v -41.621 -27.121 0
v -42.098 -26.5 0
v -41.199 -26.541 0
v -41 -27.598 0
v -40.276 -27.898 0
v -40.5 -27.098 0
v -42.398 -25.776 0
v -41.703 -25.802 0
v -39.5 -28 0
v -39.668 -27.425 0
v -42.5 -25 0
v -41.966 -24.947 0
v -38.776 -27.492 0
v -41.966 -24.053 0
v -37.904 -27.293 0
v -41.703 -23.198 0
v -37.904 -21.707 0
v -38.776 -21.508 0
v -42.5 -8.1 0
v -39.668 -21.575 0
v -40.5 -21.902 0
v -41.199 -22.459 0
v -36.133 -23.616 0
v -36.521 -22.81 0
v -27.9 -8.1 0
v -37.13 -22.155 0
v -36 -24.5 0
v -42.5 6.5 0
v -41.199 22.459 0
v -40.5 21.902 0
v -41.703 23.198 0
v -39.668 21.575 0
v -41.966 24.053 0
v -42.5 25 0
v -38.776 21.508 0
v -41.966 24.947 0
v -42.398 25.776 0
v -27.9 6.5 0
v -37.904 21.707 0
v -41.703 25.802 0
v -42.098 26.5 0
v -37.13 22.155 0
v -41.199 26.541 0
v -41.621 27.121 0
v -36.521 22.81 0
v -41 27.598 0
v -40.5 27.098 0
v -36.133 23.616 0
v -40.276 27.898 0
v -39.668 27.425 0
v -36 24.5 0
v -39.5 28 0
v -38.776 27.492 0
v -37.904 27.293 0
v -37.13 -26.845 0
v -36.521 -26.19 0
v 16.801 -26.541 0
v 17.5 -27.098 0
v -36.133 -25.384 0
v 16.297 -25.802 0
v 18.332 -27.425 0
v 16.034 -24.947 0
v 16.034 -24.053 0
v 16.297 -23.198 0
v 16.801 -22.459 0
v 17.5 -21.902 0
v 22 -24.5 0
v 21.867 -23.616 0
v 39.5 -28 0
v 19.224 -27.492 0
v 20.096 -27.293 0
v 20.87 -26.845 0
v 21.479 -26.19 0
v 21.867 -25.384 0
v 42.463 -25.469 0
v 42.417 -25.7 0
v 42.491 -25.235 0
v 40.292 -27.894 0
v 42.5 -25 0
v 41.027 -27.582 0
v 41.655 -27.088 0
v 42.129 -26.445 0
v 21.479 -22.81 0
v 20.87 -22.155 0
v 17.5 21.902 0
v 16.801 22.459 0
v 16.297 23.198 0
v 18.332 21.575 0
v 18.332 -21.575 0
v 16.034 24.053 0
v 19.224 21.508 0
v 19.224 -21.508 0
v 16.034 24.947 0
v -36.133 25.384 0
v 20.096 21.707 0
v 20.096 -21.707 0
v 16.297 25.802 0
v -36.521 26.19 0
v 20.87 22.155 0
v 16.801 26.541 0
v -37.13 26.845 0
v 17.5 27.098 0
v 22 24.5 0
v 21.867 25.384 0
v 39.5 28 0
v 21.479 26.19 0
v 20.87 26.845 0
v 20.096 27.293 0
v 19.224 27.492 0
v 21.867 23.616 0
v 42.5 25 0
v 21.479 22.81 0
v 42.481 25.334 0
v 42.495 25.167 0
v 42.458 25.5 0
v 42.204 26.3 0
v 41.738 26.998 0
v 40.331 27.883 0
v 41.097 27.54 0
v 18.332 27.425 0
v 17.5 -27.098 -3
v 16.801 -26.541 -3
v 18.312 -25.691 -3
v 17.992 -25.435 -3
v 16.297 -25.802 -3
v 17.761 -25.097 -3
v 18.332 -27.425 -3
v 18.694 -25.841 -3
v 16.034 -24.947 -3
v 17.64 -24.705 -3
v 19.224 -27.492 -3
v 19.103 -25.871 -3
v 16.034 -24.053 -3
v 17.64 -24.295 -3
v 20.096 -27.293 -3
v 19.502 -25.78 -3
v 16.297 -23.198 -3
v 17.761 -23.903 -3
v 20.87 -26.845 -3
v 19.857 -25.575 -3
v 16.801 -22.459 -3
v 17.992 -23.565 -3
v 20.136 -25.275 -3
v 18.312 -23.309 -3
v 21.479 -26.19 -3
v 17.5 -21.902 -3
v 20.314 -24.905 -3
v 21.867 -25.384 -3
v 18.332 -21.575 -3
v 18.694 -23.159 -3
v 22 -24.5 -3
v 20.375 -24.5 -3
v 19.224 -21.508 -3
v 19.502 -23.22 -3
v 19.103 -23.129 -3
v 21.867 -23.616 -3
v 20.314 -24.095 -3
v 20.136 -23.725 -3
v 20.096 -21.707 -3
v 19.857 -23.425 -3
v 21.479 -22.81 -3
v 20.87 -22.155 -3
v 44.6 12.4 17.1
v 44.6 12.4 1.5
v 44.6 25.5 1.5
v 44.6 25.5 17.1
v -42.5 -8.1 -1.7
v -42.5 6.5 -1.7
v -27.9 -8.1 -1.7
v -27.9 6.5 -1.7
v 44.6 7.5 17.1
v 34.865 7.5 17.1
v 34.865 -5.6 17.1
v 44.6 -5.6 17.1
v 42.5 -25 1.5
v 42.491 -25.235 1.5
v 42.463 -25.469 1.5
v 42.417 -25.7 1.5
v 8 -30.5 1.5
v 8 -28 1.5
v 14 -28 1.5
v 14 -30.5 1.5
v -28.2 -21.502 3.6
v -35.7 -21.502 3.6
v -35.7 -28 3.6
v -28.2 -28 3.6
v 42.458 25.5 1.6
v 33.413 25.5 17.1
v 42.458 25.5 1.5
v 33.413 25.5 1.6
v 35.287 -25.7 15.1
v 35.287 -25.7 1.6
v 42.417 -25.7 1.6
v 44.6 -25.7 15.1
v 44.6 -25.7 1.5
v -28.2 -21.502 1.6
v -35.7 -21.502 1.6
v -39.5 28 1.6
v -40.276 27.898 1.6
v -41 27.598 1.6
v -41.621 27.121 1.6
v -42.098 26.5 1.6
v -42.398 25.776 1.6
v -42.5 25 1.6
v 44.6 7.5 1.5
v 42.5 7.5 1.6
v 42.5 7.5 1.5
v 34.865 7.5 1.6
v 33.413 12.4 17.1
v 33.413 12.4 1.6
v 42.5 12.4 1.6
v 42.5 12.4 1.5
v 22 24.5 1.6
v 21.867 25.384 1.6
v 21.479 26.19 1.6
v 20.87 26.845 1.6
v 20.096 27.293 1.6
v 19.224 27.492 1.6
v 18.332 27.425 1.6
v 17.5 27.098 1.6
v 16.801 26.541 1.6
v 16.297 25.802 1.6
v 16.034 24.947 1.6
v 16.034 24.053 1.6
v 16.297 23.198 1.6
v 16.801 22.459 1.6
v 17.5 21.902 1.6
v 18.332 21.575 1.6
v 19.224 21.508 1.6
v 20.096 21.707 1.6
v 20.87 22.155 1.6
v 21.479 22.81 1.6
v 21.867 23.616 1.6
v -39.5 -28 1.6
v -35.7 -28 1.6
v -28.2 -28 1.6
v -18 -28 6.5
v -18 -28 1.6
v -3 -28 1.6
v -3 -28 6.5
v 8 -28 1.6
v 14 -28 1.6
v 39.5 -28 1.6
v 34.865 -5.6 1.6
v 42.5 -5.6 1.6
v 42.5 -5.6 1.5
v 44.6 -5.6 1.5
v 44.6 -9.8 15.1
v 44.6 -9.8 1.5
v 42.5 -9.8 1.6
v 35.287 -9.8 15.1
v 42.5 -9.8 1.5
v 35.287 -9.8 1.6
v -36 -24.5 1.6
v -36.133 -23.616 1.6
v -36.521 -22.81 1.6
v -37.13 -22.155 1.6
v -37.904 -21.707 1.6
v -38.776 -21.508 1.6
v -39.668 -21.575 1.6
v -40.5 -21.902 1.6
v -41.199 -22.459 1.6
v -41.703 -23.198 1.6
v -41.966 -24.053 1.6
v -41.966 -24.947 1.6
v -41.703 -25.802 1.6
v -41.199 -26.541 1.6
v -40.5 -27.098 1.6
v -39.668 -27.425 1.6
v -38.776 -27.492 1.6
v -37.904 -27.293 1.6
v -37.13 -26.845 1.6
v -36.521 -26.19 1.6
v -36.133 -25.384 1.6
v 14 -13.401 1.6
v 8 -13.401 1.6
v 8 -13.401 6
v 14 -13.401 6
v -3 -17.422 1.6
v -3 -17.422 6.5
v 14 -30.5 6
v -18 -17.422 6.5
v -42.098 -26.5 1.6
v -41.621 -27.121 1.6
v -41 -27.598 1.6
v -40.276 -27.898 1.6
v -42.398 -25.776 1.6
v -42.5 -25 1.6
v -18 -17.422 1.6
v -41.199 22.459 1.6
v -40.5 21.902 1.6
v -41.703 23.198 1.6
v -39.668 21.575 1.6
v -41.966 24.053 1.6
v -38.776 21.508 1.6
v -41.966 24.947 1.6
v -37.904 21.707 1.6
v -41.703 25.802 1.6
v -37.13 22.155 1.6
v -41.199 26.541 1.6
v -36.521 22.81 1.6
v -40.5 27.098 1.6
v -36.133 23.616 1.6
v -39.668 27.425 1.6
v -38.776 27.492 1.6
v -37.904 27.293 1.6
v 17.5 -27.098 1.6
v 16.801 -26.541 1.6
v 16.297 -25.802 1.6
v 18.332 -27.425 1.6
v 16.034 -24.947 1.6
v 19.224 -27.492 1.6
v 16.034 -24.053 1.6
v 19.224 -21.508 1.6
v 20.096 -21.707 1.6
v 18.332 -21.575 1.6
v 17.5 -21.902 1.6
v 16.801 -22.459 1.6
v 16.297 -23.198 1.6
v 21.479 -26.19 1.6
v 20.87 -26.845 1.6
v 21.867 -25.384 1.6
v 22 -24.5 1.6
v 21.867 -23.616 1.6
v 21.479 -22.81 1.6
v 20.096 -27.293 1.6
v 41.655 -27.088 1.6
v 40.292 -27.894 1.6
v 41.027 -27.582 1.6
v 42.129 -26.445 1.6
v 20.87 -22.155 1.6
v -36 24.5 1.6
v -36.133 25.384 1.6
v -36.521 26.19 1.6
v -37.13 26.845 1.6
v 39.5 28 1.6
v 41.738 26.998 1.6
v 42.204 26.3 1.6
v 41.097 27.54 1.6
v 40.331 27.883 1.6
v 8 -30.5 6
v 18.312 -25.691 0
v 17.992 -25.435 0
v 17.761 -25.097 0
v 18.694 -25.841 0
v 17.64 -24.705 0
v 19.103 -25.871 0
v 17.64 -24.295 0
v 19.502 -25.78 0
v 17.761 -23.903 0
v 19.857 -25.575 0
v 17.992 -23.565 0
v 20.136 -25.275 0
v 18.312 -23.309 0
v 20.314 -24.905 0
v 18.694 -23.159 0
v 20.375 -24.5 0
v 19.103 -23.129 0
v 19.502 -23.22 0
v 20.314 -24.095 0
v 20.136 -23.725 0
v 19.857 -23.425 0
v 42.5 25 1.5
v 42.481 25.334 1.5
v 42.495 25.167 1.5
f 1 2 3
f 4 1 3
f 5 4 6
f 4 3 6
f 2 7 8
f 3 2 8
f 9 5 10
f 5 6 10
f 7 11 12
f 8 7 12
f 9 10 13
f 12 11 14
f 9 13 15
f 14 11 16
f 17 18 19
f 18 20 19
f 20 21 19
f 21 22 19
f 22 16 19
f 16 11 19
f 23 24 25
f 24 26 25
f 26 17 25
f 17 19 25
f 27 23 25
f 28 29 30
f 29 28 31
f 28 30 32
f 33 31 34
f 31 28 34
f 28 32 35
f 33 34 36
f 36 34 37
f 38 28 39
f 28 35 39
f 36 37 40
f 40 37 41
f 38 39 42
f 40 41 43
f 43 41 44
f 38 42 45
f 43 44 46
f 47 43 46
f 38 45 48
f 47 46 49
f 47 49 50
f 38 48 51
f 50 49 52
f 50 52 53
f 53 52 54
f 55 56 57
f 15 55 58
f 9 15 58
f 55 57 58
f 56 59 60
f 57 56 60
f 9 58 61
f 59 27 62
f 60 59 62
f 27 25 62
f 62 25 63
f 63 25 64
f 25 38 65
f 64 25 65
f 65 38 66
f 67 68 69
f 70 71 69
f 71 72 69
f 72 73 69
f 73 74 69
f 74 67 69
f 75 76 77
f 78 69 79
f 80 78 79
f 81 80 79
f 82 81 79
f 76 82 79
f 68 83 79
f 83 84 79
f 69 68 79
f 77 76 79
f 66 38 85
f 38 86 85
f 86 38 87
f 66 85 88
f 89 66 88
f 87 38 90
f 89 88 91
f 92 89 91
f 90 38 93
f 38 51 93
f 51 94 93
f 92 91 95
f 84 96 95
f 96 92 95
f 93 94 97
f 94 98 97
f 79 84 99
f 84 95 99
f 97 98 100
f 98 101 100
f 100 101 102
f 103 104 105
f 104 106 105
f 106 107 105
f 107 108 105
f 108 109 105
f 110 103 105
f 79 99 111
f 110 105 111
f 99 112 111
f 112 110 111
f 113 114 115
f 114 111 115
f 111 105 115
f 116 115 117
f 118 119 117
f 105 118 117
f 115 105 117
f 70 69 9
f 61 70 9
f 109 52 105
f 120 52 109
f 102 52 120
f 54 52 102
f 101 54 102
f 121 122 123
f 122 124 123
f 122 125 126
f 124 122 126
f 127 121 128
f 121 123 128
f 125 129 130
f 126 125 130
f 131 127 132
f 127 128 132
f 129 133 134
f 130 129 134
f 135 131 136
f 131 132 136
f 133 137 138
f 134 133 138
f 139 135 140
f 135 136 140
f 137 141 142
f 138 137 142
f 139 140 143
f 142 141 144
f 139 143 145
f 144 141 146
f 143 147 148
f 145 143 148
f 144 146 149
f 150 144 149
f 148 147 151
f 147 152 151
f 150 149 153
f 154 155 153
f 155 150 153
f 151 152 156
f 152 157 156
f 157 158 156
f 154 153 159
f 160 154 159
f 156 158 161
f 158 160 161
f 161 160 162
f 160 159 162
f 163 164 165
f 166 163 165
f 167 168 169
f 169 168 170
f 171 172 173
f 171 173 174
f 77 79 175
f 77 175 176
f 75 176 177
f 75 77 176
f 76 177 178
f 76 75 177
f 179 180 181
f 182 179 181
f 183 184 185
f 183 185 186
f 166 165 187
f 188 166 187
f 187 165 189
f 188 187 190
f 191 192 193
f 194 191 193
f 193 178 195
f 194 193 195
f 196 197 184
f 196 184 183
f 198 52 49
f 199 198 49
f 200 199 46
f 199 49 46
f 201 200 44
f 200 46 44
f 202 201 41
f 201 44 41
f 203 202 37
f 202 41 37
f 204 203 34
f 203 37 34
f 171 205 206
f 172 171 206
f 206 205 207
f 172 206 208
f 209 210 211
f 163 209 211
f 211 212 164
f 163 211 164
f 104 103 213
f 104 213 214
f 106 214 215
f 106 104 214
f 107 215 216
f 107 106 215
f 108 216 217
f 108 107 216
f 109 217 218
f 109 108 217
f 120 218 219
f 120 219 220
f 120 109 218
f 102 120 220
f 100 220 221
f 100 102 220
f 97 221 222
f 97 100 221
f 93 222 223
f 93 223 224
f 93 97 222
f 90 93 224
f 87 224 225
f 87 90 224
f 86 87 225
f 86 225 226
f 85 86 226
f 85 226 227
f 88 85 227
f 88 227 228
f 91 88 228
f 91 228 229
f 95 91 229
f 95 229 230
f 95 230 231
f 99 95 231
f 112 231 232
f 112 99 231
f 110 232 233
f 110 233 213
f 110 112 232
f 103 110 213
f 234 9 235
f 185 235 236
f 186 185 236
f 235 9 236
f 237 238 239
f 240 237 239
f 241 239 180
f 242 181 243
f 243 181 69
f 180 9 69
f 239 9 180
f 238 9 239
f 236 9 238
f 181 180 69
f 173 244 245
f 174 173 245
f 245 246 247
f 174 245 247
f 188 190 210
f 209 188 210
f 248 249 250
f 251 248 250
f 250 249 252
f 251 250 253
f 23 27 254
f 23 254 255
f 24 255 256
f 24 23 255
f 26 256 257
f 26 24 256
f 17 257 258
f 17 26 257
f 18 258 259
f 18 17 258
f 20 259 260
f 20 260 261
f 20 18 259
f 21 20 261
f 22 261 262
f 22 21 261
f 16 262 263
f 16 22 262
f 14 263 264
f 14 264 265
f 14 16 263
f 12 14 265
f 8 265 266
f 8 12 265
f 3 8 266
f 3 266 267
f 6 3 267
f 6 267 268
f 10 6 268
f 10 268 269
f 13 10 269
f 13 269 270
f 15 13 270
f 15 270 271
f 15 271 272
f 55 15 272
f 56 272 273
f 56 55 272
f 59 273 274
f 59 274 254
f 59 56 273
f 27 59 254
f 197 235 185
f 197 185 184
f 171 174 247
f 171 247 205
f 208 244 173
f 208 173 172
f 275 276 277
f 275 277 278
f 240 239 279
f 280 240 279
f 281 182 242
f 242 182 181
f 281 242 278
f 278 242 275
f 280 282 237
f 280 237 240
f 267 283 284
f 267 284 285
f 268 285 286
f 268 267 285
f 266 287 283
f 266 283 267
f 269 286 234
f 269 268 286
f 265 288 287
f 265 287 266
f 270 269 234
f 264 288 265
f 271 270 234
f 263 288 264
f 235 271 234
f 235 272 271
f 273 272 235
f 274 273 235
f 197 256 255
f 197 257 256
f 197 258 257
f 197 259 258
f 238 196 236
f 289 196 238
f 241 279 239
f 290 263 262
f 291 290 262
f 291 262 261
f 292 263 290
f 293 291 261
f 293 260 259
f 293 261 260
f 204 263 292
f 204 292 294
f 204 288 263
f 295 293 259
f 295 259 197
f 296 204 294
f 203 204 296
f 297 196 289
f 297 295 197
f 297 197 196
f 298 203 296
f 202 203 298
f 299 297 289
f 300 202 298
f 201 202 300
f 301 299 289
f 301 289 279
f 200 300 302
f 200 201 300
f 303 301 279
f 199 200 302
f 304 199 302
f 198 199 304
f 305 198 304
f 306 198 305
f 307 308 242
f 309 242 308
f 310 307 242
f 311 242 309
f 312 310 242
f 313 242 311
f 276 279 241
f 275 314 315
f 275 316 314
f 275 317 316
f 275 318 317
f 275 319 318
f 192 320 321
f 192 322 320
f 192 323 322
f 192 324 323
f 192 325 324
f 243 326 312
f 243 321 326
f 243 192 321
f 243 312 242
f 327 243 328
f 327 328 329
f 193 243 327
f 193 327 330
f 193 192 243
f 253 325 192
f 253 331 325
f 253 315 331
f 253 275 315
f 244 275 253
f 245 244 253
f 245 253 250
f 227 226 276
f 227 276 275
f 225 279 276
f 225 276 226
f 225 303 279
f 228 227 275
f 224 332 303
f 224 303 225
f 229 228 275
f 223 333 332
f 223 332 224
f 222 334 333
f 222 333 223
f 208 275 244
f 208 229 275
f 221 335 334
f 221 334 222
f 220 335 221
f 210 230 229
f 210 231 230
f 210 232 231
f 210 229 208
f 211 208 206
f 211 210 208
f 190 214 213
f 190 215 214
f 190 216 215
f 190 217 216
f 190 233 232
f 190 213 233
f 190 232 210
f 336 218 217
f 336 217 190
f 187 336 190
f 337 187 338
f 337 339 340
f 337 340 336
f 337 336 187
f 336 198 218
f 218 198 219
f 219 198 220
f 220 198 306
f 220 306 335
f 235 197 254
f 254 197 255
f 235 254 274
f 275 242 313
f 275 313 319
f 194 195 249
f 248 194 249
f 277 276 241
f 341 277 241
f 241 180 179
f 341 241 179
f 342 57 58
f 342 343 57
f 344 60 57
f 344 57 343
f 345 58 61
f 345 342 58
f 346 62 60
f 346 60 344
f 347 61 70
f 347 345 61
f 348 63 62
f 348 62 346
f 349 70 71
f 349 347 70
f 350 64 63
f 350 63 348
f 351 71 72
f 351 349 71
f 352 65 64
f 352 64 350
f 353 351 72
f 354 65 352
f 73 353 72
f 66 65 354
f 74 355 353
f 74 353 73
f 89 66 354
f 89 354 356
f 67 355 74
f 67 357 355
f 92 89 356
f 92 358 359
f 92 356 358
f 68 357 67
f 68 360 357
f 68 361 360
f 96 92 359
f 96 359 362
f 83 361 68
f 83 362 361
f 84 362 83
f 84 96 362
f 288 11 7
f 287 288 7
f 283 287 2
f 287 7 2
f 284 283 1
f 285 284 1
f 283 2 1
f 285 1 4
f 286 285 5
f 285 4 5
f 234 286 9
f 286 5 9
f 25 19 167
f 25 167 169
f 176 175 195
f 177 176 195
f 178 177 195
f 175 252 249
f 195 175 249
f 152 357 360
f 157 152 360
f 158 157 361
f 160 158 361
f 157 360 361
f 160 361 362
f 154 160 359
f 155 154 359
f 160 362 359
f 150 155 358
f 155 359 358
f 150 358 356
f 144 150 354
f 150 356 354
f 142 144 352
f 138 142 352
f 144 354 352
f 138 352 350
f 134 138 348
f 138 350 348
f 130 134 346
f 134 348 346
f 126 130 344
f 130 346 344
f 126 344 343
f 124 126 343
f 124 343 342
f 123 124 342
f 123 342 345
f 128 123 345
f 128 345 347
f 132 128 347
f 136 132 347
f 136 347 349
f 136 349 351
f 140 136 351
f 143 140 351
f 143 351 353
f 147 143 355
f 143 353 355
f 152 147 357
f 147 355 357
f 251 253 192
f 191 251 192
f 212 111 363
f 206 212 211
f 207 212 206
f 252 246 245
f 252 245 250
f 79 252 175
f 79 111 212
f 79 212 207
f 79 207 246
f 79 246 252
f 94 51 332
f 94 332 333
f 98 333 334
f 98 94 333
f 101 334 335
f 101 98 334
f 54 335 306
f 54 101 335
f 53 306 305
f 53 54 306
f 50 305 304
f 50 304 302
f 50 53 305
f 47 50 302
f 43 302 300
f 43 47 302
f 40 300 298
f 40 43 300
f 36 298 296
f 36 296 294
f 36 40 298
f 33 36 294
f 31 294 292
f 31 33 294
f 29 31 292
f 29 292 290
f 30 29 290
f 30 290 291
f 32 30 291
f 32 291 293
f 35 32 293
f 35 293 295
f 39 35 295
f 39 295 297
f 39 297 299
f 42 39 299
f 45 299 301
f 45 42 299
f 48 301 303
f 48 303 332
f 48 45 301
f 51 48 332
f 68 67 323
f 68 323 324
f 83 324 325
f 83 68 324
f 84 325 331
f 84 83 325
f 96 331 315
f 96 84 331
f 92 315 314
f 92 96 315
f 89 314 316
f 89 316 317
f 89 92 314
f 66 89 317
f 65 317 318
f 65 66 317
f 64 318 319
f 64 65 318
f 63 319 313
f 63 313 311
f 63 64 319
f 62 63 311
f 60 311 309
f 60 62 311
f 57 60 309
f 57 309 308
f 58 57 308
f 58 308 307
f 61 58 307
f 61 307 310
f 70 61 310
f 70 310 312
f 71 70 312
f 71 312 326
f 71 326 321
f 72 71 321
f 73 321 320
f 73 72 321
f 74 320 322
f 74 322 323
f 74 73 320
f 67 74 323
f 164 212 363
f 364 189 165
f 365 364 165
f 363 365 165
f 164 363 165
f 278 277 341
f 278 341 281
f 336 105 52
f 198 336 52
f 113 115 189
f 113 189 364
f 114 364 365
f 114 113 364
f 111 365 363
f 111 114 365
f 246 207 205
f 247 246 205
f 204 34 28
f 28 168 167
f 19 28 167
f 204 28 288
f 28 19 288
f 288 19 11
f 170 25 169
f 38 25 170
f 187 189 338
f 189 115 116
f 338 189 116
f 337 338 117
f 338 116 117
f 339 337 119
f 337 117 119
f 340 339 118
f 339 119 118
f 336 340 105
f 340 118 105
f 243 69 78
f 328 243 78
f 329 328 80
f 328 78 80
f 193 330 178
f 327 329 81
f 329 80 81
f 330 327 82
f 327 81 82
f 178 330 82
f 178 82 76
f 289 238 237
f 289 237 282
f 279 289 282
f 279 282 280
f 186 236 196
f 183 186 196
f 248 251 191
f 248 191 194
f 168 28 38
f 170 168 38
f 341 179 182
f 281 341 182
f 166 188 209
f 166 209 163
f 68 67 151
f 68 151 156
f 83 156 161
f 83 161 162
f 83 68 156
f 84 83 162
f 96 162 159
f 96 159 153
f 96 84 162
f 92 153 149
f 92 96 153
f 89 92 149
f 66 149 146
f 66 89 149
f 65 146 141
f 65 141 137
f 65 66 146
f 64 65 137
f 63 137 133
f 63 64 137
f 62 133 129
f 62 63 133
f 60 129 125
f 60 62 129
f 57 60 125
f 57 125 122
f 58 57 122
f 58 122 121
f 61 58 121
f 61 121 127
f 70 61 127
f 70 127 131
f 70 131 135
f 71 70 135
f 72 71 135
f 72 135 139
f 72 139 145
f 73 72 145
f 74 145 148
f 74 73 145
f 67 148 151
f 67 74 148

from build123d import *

# Parameters (mm, degrees)
F0_W     = 14.6
F0_H     = 14.6
F0_R     = 3
F0_W_2   = 7.6352092624
F0_H_2   = 13.1
F0_W_3   = 6
F0_H_3   = 14.598642543
F0_W_4   = 15
F0_H_4   = 10.5779423118
F0_W_5   = 7.5
F0_H_5   = 6.4980006516
F1_DEPTH = 1.6
F2_DEPTH = 1.7
F0_W_6   = 2.1
F3_DEPTH = 17.1
F4_DEPTH = 15.1
F0_H_6   = 2.5
F5_DEPTH = 6
F6_DEPTH = 6.5
F7_DEPTH = 1.5
F8_DEPTH = 3.6
F0_R_2   = 1.375
F9_DEPTH = 3


with BuildPart() as f1:
    # F0 (on Top) → F1 (new body)
    with BuildSketch(Plane.XY):
        with Locations((-35.2, -0.8)):
            Rectangle(F0_W, F0_H)
        with BuildLine():
            ThreePointArc((-42.5, -25), (-41.6213203436, -27.1213203436), (-39.5, -28))
            Line((-39.5, -28), (-35.7, -28))
            Line((-35.7, -28), (-35.7, -21.5019993484))
            Line((-35.7, -21.5019993484), (-28.2, -21.5019993484))
            Line((-28.2, -21.5019993484), (-28.2, -28))
            Line((-28.2, -28), (-18, -28))
            Line((-18, -28), (-18, -17.4220576882))
            Line((-18, -17.4220576882), (-3, -17.4220576882))
            Line((-3, -17.4220576882), (-3, -28))
            Line((-3, -28), (8, -28))
            Line((8, -28), (8, -13.401357457))
            Line((8, -13.401357457), (14, -13.401357457))
            Line((14, -13.401357457), (14, -28))
            Line((14, -28), (39.5, -28))
            ThreePointArc((39.5, -28), (41.3574175621, -27.3558437979), (42.4171904292, -25.7))
            Line((42.4171904292, -25.7), (35.2872274816, -25.7))
            Line((35.2872274816, -25.7), (35.2872274816, -9.8))
            Line((35.2872274816, -9.8), (42.5, -9.8))
            Line((42.5, -9.8), (42.5, -5.6))
            Line((42.5, -5.6), (34.8647907376, -5.6))
            Line((34.8647907376, -5.6), (34.8647907376, 7.5))
            Line((34.8647907376, 7.5), (42.5, 7.5))
            Line((42.5, 7.5), (42.5, 12.4))
            Line((42.5, 12.4), (33.4132947028, 12.4))
            Line((33.4132947028, 12.4), (33.4132947028, 25.5))
            Line((33.4132947028, 25.5), (42.4580398915, 25.5))
            ThreePointArc((42.4580398915, 25.5), (41.4364916731, 27.2912878475), (39.5, 28))
            Line((39.5, 28), (-39.5, 28))
            ThreePointArc((-39.5, 28), (-41.6213203436, 27.1213203436), (-42.5, 25))
            Line((-42.5, 25), (-42.5, 6.5))
            Line((-42.5, 6.5), (-27.9, 6.5))
            Line((-27.9, 6.5), (-27.9, -8.1))
            Line((-27.9, -8.1), (-42.5, -8.1))
            Line((-42.5, -8.1), (-42.5, -25))
        make_face()
        with Locations((-39, -24.5)):
            Circle(F0_R, mode=Mode.SUBTRACT)
        with Locations((19, -24.5)):
            Circle(F0_R, mode=Mode.SUBTRACT)
        with Locations((-39, 24.5)):
            Circle(F0_R, mode=Mode.SUBTRACT)
        with Locations((19, 24.5)):
            Circle(F0_R, mode=Mode.SUBTRACT)
        with BuildLine():
            Line((35.2872274816, -25.7), (42.4171904292, -25.7))
            ThreePointArc((42.4171904292, -25.7), (42.4792256786, -25.3524405712), (42.5, -25))
            Line((42.5, -25), (42.5, -9.8))
            Line((42.5, -9.8), (35.2872274816, -9.8))
            Line((35.2872274816, -9.8), (35.2872274816, -25.7))
        make_face()
        with Locations((38.6823953688, 0.95)):
            Rectangle(F0_W_2, F0_H_2)
        with BuildLine():
            ThreePointArc((42.5, 25), (42.4894915684, 25.2508787808), (42.4580398915, 25.5))
            Line((42.4580398915, 25.5), (33.4132947028, 25.5))
            Line((33.4132947028, 25.5), (33.4132947028, 12.4))
            Line((33.4132947028, 12.4), (42.5, 12.4))
            Line((42.5, 12.4), (42.5, 25))
        make_face()
        with Locations((11, -20.7006787285)):
            Rectangle(F0_W_3, F0_H_3)
        with Locations((-10.5, -22.7110288441)):
            Rectangle(F0_W_4, F0_H_4)
        with Locations((-31.95, -24.7509996742)):
            Rectangle(F0_W_5, F0_H_5)
    extrude(amount=F1_DEPTH)

    # F0 (on Top) → F2 (join)
    with BuildSketch(Plane.XY):
        with Locations((-35.2, -0.8)):
            Rectangle(F0_W, F0_H)
    extrude(amount=-F2_DEPTH)

    # F0 (on Top) → F3 (join)
    with BuildSketch(Plane.XY):
        with Locations((38.6823953688, 0.95)):
            Rectangle(F0_W_2, F0_H_2)
        with Locations((43.55, 0.95)):
            Rectangle(F0_W_6, F0_H_2)
        with BuildLine():
            ThreePointArc((42.5, 25), (42.4894915684, 25.2508787808), (42.4580398915, 25.5))
            Line((42.4580398915, 25.5), (33.4132947028, 25.5))
            Line((33.4132947028, 25.5), (33.4132947028, 12.4))
            Line((33.4132947028, 12.4), (42.5, 12.4))
            Line((42.5, 12.4), (42.5, 25))
        make_face()
        with BuildLine():
            Line((44.6, 25.5), (42.4580398915, 25.5))
            ThreePointArc((42.4580398915, 25.5), (42.4894915684, 25.2508787808), (42.5, 25))
            Line((42.5, 25), (42.5, 12.4))
            Line((42.5, 12.4), (44.6, 12.4))
            Line((44.6, 12.4), (44.6, 25.5))
        make_face()
    extrude(amount=F3_DEPTH)

    # F0 (on Top) → F4 (join)
    with BuildSketch(Plane.XY):
        with BuildLine():
            ThreePointArc((42.5, -25), (42.4792256786, -25.3524405712), (42.4171904292, -25.7))
            Line((42.4171904292, -25.7), (44.6, -25.7))
            Line((44.6, -25.7), (44.6, -9.8))
            Line((44.6, -9.8), (42.5, -9.8))
            Line((42.5, -9.8), (42.5, -25))
        make_face()
        with BuildLine():
            Line((35.2872274816, -25.7), (42.4171904292, -25.7))
            ThreePointArc((42.4171904292, -25.7), (42.4792256786, -25.3524405712), (42.5, -25))
            Line((42.5, -25), (42.5, -9.8))
            Line((42.5, -9.8), (35.2872274816, -9.8))
            Line((35.2872274816, -9.8), (35.2872274816, -25.7))
        make_face()
    extrude(amount=F4_DEPTH)

    # F0 (on Top) → F5 (join)
    with BuildSketch(Plane.XY):
        with Locations((11, -20.7006787285)):
            Rectangle(F0_W_3, F0_H_3)
        with Locations((11, -29.25)):
            Rectangle(F0_W_3, F0_H_6)
    extrude(amount=F5_DEPTH)

    # F0 (on Top) → F6 (join)
    with BuildSketch(Plane.XY):
        with Locations((-10.5, -22.7110288441)):
            Rectangle(F0_W_4, F0_H_4)
    extrude(amount=F6_DEPTH)

    # F0 (on Top) → F7 (cut)
    with BuildSketch(Plane.XY):
        with BuildLine():
            Line((44.6, 25.5), (42.4580398915, 25.5))
            ThreePointArc((42.4580398915, 25.5), (42.4894915684, 25.2508787808), (42.5, 25))
            Line((42.5, 25), (42.5, 12.4))
            Line((42.5, 12.4), (44.6, 12.4))
            Line((44.6, 12.4), (44.6, 25.5))
        make_face()
        with Locations((43.55, 0.95)):
            Rectangle(F0_W_6, F0_H_2)
        with BuildLine():
            ThreePointArc((42.5, -25), (42.4792256786, -25.3524405712), (42.4171904292, -25.7))
            Line((42.4171904292, -25.7), (44.6, -25.7))
            Line((44.6, -25.7), (44.6, -9.8))
            Line((44.6, -9.8), (42.5, -9.8))
            Line((42.5, -9.8), (42.5, -25))
        make_face()
        with Locations((11, -29.25)):
            Rectangle(F0_W_3, F0_H_6)
    extrude(amount=F7_DEPTH, mode=Mode.SUBTRACT)

    # F0 (on Top) → F8 (join)
    with BuildSketch(Plane.XY):
        with Locations((-31.95, -24.7509996742)):
            Rectangle(F0_W_5, F0_H_5)
    extrude(amount=F8_DEPTH)


with BuildPart() as f9:
    # F0 (on Top) → F9 (new body)
    with BuildSketch(Plane.XY):
        with Locations((19, -24.5)):
            Circle(F0_R)
        with Locations((19, -24.5)):
            Circle(F0_R_2, mode=Mode.SUBTRACT)
    extrude(amount=-F9_DEPTH)


solid = Compound([f1.part, f9.part])
